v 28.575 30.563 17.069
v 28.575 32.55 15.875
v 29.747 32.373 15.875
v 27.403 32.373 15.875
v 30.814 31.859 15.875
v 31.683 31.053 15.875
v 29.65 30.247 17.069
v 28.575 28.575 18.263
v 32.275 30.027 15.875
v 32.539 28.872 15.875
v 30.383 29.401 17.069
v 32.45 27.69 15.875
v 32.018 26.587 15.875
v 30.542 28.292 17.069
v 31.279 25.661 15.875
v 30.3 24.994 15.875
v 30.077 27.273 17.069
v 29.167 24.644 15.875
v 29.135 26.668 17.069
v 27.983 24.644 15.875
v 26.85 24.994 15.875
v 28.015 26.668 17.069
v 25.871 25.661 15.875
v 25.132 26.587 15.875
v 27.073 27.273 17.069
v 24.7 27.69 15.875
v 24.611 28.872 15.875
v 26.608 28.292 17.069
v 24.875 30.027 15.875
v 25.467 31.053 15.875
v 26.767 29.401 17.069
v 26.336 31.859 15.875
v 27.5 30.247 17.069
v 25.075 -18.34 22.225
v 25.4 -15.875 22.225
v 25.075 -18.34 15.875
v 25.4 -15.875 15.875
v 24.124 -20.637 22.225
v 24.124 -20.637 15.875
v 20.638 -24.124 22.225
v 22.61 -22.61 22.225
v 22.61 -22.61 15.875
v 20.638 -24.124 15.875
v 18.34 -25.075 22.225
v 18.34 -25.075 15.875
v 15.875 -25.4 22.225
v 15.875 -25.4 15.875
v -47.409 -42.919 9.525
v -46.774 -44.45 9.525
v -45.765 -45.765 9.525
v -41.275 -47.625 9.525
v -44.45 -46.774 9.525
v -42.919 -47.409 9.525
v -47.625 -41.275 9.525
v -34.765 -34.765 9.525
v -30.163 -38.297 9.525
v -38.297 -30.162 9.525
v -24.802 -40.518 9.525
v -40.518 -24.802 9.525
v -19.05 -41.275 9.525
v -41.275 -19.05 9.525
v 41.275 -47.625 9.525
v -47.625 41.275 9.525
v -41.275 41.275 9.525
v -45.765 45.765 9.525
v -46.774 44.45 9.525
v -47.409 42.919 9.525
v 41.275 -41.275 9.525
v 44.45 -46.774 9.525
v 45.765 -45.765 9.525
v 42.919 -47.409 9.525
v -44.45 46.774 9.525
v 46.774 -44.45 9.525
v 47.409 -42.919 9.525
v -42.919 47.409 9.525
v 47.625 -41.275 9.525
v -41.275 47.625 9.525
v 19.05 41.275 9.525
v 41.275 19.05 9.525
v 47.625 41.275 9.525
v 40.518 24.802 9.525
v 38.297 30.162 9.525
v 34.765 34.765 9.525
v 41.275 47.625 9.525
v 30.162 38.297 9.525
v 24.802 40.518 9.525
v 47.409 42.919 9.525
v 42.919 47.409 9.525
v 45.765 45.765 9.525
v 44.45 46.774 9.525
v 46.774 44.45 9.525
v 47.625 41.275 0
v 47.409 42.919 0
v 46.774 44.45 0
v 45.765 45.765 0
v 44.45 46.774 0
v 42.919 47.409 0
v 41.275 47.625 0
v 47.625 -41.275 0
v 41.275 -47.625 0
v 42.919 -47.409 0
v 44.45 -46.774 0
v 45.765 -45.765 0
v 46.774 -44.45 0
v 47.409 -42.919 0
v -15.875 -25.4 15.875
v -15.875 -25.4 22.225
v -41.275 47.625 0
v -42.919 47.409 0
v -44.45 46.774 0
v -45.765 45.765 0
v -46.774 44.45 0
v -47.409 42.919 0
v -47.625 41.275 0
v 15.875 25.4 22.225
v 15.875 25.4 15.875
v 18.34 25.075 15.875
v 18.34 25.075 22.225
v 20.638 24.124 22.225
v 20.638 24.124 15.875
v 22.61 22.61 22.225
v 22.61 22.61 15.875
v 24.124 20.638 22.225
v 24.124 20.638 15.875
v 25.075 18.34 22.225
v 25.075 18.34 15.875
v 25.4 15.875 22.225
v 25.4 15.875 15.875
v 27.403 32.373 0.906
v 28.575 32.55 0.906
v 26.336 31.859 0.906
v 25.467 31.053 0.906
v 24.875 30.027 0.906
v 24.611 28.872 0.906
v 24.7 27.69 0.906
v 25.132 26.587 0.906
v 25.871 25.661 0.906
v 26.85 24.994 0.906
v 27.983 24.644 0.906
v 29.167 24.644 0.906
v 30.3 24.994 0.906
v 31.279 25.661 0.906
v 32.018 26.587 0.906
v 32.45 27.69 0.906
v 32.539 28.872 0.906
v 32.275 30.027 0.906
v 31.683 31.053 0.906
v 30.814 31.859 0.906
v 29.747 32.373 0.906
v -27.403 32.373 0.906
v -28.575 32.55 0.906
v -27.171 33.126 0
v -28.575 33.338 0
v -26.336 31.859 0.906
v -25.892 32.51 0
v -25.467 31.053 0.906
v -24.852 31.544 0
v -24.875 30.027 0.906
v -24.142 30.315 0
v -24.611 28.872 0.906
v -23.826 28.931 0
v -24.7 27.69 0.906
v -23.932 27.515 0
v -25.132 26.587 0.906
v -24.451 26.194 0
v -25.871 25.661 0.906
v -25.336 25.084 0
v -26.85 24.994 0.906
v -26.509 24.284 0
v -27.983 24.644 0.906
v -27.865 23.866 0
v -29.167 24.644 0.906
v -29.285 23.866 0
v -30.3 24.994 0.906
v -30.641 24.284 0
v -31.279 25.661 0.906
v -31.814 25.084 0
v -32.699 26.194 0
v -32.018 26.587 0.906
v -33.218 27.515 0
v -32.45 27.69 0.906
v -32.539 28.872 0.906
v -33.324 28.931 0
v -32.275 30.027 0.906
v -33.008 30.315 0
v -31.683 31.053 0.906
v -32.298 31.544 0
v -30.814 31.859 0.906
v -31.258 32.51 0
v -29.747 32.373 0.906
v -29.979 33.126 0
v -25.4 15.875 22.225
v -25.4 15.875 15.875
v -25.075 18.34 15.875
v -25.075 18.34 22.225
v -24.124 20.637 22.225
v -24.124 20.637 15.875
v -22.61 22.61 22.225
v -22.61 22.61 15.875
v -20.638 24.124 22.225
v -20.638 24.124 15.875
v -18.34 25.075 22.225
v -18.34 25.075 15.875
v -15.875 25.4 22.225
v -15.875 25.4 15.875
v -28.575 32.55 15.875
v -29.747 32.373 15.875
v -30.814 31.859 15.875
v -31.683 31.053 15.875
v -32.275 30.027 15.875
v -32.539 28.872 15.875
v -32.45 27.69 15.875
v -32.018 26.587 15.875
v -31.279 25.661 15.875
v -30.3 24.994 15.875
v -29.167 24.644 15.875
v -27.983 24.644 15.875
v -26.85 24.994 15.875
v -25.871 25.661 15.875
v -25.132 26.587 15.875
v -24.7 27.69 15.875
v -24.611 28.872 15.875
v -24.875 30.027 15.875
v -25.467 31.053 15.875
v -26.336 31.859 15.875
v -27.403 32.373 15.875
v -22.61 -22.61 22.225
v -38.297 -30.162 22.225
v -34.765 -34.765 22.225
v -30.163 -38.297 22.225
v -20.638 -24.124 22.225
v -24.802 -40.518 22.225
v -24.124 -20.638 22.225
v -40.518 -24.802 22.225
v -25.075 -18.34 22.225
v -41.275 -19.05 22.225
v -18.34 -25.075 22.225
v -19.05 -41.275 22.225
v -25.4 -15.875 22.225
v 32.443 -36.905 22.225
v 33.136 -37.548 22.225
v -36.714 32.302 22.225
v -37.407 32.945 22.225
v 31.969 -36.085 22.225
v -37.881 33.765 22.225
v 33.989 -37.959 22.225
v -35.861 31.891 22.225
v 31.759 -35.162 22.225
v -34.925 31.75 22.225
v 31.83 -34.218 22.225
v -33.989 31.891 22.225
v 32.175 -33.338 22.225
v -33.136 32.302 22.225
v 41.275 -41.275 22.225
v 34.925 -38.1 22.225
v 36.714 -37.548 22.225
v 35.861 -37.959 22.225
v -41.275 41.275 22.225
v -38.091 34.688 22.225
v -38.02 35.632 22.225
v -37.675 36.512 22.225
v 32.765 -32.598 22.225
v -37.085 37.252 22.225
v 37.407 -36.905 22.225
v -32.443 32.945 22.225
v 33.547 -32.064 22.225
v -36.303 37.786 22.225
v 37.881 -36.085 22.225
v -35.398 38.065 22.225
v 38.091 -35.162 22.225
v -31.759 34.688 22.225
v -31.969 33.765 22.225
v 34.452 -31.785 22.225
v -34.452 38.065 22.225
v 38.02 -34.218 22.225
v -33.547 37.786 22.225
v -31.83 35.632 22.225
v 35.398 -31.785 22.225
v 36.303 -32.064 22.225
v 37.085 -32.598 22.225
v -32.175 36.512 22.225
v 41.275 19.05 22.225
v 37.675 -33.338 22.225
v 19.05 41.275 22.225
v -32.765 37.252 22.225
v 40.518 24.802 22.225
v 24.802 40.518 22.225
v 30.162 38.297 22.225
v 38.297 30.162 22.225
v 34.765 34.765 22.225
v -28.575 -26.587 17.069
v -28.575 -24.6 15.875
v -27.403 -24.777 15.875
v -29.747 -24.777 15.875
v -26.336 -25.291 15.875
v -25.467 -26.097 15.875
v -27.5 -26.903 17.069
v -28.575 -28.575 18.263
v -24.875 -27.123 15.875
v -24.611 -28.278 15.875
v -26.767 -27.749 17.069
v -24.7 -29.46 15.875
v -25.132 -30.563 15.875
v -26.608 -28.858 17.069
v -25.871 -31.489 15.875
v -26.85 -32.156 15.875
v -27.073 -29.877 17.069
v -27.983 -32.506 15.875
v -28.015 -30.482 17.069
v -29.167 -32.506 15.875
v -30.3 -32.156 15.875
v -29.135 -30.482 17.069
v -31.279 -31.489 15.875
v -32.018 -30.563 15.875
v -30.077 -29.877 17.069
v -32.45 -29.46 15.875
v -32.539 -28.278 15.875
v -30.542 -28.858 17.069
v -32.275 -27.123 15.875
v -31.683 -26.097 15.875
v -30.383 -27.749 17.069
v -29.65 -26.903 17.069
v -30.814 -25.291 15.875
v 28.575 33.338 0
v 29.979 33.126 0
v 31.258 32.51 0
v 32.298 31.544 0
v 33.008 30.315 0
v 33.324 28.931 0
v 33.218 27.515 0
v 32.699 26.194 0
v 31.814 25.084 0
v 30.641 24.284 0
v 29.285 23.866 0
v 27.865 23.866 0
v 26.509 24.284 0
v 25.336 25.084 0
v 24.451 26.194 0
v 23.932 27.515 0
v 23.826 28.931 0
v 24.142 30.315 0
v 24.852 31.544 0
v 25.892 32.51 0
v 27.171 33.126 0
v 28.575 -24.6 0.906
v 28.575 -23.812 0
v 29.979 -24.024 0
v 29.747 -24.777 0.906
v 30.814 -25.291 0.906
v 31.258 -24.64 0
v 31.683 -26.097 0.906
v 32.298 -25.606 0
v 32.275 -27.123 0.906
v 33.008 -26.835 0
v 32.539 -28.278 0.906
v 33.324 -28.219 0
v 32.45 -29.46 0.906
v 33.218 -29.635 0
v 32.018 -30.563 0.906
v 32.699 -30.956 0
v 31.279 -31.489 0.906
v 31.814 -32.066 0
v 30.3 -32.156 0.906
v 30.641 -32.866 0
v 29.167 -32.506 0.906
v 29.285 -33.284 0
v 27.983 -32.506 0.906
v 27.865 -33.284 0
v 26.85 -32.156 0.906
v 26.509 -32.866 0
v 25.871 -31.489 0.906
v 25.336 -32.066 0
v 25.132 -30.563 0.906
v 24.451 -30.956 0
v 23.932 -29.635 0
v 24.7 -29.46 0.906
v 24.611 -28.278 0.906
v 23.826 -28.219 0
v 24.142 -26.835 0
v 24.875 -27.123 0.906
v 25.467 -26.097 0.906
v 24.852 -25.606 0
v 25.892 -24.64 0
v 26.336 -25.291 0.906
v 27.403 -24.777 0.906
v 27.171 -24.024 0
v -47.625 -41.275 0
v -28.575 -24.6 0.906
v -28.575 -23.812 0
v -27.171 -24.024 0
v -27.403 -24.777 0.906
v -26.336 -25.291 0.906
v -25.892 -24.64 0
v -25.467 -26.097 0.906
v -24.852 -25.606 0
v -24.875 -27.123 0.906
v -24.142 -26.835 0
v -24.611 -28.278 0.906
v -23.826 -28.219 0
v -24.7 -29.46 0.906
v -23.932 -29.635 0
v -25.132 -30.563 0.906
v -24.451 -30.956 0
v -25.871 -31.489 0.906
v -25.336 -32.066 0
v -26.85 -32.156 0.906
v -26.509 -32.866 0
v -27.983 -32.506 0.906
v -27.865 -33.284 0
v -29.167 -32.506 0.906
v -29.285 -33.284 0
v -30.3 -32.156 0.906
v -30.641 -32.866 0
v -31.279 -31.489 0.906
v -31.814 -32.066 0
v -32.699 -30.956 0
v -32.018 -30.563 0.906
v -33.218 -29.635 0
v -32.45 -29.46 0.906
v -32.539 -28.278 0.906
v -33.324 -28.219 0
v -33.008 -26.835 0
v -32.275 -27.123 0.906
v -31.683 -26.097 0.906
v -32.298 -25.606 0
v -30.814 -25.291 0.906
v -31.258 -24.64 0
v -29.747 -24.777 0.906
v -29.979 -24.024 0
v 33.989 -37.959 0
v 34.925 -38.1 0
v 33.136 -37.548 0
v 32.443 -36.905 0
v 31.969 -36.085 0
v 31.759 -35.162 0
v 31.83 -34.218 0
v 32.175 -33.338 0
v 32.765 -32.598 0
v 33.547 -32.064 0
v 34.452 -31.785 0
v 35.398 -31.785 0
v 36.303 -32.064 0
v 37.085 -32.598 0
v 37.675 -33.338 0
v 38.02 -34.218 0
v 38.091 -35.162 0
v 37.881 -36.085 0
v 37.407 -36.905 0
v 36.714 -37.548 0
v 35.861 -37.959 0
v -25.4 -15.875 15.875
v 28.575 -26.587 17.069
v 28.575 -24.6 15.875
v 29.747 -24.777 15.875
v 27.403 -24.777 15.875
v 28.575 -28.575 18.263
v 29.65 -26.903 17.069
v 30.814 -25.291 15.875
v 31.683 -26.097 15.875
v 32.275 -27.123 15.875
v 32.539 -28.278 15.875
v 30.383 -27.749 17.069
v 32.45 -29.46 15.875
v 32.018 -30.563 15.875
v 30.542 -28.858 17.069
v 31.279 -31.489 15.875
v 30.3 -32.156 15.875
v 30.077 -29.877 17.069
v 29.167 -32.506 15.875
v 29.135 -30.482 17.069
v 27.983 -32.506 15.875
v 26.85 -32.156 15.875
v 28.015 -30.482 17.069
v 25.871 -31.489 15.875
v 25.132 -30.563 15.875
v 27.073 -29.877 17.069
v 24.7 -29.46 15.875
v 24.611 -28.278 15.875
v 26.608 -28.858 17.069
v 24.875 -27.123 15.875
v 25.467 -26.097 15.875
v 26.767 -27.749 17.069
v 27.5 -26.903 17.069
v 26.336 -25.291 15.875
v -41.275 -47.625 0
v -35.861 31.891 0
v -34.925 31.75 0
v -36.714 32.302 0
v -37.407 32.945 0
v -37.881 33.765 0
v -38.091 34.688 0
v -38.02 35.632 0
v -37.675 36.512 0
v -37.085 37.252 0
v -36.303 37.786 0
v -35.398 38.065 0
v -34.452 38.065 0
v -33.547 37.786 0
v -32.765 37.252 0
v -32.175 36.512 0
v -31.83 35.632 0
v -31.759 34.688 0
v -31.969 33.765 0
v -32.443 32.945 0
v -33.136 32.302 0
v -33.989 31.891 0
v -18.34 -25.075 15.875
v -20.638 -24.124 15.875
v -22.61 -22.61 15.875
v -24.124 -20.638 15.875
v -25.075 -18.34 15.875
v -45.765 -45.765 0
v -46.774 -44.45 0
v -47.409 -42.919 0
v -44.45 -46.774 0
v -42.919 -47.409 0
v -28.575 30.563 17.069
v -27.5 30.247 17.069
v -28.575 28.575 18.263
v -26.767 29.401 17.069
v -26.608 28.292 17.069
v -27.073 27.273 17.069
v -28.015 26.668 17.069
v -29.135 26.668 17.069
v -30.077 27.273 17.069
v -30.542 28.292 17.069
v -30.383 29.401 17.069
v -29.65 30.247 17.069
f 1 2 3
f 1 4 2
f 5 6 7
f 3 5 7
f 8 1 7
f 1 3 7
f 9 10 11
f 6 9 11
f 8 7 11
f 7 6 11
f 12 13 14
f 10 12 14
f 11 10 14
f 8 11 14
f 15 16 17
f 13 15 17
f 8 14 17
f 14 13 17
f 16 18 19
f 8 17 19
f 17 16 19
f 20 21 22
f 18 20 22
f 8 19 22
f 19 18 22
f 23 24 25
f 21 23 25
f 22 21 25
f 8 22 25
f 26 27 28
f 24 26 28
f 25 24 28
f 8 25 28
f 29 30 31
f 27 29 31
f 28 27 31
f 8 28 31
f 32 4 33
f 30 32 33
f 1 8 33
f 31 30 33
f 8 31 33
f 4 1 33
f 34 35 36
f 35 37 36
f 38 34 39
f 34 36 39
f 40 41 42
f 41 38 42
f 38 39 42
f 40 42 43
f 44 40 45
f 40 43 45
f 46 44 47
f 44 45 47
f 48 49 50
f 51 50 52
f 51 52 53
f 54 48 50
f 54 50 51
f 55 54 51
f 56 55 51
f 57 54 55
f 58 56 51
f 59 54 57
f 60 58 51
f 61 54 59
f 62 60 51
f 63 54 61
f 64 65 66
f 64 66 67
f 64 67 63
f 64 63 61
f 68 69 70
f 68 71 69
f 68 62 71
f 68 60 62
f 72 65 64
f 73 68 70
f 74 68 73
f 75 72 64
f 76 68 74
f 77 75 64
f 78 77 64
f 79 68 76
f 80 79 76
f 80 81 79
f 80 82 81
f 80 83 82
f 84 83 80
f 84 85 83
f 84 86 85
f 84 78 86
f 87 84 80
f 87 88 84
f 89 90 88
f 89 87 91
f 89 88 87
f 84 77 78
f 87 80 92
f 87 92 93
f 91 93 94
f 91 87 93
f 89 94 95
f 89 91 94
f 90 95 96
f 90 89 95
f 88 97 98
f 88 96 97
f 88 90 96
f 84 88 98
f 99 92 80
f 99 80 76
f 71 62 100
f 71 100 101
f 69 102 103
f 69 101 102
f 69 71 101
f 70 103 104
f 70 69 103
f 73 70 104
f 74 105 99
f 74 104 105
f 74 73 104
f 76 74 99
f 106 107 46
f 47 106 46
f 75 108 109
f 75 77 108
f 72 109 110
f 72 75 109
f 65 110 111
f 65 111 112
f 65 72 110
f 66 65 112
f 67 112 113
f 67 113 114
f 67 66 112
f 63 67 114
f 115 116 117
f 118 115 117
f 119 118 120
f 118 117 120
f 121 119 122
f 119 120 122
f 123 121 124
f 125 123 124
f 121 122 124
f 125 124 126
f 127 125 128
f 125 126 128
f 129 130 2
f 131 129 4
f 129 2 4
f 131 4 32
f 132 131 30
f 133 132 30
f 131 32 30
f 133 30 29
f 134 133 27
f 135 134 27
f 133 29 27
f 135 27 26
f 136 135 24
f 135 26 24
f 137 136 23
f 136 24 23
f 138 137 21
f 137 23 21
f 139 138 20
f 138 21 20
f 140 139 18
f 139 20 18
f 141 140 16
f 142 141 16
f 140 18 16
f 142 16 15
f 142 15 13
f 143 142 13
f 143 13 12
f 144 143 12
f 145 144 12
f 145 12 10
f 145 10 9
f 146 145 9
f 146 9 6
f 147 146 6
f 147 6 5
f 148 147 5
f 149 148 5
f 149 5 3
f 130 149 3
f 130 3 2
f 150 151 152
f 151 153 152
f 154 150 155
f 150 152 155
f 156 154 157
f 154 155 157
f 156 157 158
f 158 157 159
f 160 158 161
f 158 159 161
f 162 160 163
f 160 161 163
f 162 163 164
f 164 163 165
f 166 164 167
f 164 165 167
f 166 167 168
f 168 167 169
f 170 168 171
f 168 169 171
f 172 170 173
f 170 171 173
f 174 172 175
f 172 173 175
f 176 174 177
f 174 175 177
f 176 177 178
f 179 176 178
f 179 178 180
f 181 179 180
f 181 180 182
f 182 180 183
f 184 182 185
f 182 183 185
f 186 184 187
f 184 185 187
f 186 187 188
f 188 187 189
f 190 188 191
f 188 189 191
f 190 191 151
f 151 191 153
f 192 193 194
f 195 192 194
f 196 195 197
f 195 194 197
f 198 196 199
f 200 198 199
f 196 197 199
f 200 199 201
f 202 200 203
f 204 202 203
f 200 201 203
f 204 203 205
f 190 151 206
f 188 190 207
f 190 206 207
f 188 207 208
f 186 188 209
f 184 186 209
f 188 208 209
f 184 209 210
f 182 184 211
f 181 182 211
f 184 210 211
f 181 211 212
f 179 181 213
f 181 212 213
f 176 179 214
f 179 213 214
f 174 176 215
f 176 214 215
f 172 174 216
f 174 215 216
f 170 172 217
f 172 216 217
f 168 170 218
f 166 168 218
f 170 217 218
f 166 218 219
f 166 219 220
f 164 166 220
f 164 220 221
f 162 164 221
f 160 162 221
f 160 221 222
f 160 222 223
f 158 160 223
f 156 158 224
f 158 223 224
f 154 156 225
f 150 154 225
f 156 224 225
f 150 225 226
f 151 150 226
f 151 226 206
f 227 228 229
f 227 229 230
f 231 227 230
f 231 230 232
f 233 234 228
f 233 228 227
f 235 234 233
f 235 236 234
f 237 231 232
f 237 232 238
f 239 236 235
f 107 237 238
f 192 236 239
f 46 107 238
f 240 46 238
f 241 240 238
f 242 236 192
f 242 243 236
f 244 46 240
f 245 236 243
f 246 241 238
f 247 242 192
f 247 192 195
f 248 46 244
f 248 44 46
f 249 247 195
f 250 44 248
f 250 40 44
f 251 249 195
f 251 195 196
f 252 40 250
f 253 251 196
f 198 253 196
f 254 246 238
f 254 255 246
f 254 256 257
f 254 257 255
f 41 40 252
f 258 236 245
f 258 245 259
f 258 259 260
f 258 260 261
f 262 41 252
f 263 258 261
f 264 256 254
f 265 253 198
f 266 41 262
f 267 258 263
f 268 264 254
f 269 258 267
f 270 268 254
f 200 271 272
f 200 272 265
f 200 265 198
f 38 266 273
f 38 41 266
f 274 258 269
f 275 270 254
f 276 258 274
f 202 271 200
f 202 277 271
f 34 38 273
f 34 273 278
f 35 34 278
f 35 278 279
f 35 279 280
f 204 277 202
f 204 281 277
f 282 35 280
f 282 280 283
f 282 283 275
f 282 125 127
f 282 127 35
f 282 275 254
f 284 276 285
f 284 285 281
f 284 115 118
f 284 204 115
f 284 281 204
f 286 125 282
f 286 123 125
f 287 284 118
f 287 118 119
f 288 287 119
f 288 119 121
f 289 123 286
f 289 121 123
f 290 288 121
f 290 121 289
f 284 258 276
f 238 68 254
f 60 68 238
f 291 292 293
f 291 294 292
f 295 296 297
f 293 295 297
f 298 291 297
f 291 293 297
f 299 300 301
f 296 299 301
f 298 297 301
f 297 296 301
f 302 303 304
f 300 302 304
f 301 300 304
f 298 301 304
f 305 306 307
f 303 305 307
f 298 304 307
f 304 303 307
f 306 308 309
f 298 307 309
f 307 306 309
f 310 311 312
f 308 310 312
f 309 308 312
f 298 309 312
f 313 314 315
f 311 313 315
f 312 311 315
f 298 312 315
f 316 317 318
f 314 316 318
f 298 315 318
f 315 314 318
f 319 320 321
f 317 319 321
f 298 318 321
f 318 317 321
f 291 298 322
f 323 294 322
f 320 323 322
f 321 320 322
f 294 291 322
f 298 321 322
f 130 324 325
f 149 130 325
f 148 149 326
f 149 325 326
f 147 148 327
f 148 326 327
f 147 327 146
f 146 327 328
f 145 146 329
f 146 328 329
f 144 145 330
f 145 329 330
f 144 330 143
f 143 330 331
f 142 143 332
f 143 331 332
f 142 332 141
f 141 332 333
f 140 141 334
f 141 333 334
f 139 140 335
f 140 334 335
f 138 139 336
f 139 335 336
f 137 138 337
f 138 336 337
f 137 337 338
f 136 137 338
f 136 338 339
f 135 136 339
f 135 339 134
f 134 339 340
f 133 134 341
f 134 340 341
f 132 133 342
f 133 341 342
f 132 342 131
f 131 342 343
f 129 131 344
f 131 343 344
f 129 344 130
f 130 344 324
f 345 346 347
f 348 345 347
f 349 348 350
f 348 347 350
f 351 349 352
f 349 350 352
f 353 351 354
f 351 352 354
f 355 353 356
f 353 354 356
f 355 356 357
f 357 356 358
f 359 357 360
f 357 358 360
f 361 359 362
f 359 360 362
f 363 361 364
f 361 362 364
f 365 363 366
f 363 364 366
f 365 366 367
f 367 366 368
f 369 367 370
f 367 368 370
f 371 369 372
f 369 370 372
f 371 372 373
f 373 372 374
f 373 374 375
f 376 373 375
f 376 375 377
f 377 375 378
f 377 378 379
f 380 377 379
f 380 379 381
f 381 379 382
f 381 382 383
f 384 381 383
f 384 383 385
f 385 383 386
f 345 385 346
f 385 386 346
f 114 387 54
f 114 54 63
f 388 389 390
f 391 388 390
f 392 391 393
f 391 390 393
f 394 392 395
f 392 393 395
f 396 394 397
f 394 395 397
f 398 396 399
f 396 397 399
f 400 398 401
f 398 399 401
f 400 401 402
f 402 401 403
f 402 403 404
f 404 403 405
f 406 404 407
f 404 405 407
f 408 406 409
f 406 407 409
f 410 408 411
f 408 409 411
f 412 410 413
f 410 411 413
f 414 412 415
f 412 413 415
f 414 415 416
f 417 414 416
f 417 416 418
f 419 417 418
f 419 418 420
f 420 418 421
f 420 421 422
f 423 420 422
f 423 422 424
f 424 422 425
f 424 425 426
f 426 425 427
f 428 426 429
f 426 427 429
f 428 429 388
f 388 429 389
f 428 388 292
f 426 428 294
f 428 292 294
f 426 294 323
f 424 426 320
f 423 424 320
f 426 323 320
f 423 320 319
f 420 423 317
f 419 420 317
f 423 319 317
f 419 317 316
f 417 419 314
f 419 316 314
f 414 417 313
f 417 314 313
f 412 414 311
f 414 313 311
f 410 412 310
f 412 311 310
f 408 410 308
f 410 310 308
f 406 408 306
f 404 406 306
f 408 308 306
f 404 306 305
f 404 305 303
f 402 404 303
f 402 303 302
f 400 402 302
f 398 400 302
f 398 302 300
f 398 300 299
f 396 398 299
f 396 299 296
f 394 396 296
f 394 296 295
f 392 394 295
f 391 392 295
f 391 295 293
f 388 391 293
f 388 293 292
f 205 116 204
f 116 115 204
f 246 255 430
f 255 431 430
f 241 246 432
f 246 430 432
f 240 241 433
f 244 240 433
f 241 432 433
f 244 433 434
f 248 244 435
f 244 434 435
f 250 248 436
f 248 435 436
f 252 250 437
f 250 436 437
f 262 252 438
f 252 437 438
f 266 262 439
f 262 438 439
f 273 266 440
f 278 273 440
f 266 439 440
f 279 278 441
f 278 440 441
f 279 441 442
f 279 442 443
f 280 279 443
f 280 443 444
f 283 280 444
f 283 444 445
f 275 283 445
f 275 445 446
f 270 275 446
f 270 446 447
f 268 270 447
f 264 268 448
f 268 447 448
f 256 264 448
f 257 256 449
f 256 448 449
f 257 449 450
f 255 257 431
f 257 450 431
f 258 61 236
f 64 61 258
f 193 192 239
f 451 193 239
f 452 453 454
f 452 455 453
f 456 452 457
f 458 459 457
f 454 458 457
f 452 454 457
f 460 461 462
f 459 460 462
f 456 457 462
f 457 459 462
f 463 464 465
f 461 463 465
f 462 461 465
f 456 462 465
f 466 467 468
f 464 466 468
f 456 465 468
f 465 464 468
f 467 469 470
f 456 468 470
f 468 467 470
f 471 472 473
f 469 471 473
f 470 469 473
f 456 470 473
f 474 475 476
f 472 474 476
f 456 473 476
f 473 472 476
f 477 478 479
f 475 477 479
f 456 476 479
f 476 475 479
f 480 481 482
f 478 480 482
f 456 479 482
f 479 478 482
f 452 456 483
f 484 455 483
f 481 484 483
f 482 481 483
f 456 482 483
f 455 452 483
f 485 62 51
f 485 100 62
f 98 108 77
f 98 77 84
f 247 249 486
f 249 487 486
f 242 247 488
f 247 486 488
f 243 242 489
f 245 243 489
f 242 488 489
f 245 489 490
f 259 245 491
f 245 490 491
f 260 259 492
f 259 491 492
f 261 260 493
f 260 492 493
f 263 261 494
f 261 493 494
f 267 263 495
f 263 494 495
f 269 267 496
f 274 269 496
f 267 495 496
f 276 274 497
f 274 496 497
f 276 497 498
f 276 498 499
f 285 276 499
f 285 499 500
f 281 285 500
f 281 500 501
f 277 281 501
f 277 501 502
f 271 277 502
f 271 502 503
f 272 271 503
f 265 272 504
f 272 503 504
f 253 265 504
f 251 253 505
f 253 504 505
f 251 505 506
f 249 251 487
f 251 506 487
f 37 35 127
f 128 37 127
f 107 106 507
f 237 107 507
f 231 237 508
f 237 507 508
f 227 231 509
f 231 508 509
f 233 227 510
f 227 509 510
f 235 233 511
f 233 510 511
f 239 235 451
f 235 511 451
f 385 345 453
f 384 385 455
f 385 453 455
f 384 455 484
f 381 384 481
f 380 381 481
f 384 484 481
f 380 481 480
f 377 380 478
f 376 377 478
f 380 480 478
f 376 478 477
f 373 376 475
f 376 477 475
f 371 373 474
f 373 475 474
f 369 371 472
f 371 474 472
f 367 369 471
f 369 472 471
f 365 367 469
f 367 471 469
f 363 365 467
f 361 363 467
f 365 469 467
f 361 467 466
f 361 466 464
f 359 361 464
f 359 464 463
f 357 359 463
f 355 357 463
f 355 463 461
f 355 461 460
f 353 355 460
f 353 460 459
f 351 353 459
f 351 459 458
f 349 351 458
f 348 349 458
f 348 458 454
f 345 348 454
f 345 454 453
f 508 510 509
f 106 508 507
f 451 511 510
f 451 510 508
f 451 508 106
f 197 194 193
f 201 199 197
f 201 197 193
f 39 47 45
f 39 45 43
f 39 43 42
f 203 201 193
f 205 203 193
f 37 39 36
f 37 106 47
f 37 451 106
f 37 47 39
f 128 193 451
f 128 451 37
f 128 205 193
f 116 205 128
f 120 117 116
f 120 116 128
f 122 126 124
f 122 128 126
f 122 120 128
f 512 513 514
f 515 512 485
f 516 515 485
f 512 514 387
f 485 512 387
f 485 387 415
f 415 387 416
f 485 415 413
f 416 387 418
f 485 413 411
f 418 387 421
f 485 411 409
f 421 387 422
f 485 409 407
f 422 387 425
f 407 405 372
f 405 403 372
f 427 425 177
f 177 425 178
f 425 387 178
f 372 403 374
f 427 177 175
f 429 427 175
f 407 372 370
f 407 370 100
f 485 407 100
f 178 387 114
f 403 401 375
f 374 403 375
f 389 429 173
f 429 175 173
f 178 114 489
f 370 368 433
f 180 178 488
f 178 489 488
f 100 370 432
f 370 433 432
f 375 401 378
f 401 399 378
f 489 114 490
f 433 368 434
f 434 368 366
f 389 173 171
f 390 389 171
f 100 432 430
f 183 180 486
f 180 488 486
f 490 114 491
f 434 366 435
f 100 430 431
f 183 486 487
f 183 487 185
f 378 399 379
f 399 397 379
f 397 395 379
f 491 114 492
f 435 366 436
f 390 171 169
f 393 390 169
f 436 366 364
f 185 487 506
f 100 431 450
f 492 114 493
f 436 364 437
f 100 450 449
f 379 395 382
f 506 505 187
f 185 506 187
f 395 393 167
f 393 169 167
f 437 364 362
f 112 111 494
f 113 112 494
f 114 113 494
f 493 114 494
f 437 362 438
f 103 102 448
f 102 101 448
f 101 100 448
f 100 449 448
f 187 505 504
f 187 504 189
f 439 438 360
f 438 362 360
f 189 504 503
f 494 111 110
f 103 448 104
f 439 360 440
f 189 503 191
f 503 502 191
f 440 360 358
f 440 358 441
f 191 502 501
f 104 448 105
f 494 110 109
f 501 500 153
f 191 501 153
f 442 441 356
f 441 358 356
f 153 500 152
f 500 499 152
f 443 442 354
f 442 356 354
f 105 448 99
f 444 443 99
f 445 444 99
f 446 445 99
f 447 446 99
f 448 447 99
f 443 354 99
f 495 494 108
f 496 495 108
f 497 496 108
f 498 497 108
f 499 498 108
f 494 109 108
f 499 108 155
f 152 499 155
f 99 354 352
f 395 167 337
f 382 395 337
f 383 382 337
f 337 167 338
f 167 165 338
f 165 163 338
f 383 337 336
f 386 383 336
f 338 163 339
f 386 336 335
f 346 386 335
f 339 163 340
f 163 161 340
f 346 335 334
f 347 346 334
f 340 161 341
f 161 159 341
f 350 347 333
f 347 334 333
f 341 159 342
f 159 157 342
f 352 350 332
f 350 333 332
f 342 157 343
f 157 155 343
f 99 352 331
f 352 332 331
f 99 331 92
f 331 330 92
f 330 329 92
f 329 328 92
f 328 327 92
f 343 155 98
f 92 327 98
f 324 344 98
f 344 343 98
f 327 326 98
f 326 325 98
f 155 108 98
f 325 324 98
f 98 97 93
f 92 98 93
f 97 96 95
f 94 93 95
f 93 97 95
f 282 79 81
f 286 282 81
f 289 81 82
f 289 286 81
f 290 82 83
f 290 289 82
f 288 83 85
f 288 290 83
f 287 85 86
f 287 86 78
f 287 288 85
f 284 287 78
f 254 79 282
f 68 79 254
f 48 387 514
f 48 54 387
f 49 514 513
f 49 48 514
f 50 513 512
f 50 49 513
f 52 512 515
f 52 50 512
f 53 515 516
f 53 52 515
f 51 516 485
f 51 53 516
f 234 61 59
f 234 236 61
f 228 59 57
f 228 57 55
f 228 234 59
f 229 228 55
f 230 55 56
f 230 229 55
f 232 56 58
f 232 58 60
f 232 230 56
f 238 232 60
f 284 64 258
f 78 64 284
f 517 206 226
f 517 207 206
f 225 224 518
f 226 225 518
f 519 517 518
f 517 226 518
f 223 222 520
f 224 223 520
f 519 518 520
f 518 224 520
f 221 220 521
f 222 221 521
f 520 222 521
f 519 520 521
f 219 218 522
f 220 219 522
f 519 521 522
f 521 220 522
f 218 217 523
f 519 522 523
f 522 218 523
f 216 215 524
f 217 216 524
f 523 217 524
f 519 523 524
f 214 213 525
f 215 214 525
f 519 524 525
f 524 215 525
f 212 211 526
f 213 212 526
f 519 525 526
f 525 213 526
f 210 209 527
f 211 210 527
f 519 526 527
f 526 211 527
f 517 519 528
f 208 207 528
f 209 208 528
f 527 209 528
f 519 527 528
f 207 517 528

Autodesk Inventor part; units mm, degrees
ref_plane "YZ Plane" through (0, 0, 0) normal (1, 0, 0) x (0, 1, 0)
ref_plane "XZ Plane" through (0, 0, 0) normal (0, 1, 0) x (-1, 0, 0)
ref_plane "XY Plane" through (0, 0, 0) normal (0, 0, 1) x (1, 0, 0)
sketch "Sketch1" plane through (0, 0, 0) normal (0, 0, 1) x (1, 0, 0)
  line L0 (-47.625, 47.625) -> (47.625, 47.625)
  line L1 (47.625, 47.625) -> (47.625, -47.625)
  line L2 (47.625, -47.625) -> (-47.625, -47.625)
  line L3 (-47.625, -47.625) -> (-47.625, 47.625)
  line L4 (-47.625, 47.625) -> (47.625, -47.625) construction
  line L5 (47.625, 47.625) -> (-47.625, -47.625) construction
  point P0 (0, 0)
  dimension "d0" = 95.25
  dimension "d1" = 95.25
extrude "Extrusion1" add sketch "Sketch1" along normal blind 9.525
sketch "Sketch2" plane through (0, 0, 9.525) normal (0, 0, 1) x (1, 0, 0)
  line L0 (41.275, -41.275) -> (-41.275, -41.275)
  line L1 (-41.275, -41.275) -> (-41.275, 41.275)
  line L2 (-41.275, 41.275) -> (41.275, 41.275)
  line L3 (41.275, 41.275) -> (41.275, -41.275)
  line L4 (41.275, -41.275) -> (-41.275, 41.275) construction
  line L5 (-41.275, -41.275) -> (41.275, 41.275) construction
  point P0 (0, 0)
  dimension "d4" = 82.55
  dimension "d5" = 82.55
extrude "Extrusion2" add sketch "Sketch2" along normal blind 12.7
sketch "Sketch3" plane through (0, 0, 22.225) normal (0, 0, 1) x (1, 0, 0)
  line L0 (-25.4, -25.4) -> (25.4, -25.4)
  line L1 (25.4, -25.4) -> (25.4, 25.4)
  line L2 (25.4, 25.4) -> (-25.4, 25.4)
  line L3 (-25.4, 25.4) -> (-25.4, -25.4)
  line L4 (-25.4, -25.4) -> (25.4, 25.4) construction
  line L5 (25.4, -25.4) -> (-25.4, 25.4) construction
  point P0 (0, 0)
  dimension "d8" = 50.8
  dimension "d9" = 50.8
extrude "Extrusion3" cut sketch "Sketch3" against normal blind 6.35
sketch "Sketch4" plane through (0, 0, 22.225) normal (0, 0, 1) x (1, 0, 0)
  line L0 (-41.275, 41.275) -> (-41.275, -41.275) projected
  line L1 (41.275, 41.275) -> (-41.275, 41.275) projected
  line L2 (-41.275, -41.275) -> (41.275, -41.275) projected
  line L3 (41.275, -41.275) -> (41.275, 41.275) projected
  point P0 (0, 0)
  point P1 (-34.925, 34.925)
  point P2 (34.925, -34.925)
  dimension "d19" = 6.35
  dimension "d20" = 6.35
  dimension "d21" = 6.35
  dimension "d22" = 6.35
hole "Hole1" at (-34.925, 34.925, 22.225) at (34.925, -34.925, 22.225) direction (0, 0, -1) diameter 6.35 end through all
sketch "Sketch5" plane through (0, 0, 0) normal (0, 0, -1) x (-1, 0, 0)
  point P0 (0, 0)
  point P1 (-28.575, 28.575)
  point P2 (28.575, 28.575)
  point P3 (28.575, -28.575)
  point P4 (-28.575, -28.575)
  dimension "d37" = 57.15
  dimension "d38" = 28.575
  dimension "d39" = 57.15
  dimension "d40" = 28.575
  dimension "d41" = 57.15
  dimension "d42" = 57.15
  dimension "d43" = 28.575
  dimension "d44" = 28.575
hole "Hole2" at (28.575, 28.575, 0) at (-28.575, 28.575, 0) at (-28.575, -28.575, 0) at (28.575, -28.575, 0) direction (0, 0, 1) diameter 7.9502 depth 15.875 tip angle 118 countersink diameter 9.525 countersink angle 82
fillet "Fillet1" radius 6.35 4 edges at (47.625, -47.625, 4.7625) (-47.625, -47.625, 4.7625) (47.625, 47.625, 4.7625) (-47.625, 47.625, 4.7625)
fillet "Fillet3" radius 22.225 2 edges at (41.275, 41.275, 15.875) (-41.275, -41.275, 15.875)
fillet "Fillet4" radius 9.525 4 edges at (-25.4, 25.4, 19.05) (-25.4, -25.4, 19.05) (25.4, 25.4, 19.05) (25.4, -25.4, 19.05)
thread "Thread1" size "3/8-16 UNC" class "2B" standard "ANSI Unified Screw Threads" full length
thread "Thread2" size "3/8-16 UNC" class "2B" standard "ANSI Unified Screw Threads" full length
thread "Thread3" size "3/8-16 UNC" class "2B" standard "ANSI Unified Screw Threads" full length
thread "Thread4" size "3/8-16 UNC" class "2B" standard "ANSI Unified Screw Threads" full length
properties part number "KUMAR_ACT6_L1" material "Aluminum 6061"
